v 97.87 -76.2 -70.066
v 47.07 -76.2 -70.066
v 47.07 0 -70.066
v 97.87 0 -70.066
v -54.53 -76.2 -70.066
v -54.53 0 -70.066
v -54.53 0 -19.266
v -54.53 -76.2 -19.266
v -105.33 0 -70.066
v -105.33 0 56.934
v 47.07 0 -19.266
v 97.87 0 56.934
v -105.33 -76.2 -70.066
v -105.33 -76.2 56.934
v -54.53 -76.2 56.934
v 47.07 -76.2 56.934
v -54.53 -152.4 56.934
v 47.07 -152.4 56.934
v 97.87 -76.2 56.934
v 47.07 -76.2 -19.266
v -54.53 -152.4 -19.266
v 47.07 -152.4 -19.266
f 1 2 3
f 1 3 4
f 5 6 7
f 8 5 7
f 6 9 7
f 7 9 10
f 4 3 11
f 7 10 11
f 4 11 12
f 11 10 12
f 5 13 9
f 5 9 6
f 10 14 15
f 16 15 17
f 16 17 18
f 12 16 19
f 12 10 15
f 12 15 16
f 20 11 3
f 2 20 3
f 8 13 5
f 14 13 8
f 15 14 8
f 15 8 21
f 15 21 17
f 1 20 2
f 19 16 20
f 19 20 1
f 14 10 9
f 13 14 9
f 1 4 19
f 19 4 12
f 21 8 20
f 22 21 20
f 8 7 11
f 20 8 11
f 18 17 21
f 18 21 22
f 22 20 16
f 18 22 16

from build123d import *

# Parameters (mm, degrees)
F0_W     = 101.6
F0_H     = 76.2
F1_DEPTH = 76.2
F2_W     = 101.6
F2_H     = 76.2
F3_DEPTH = 76.2


with BuildPart() as f1:
    # F0 (on Front) → F1 (new body)
    with BuildSketch(Plane.XZ):
        with Locations((-3.729625, 18.833704)):
            Rectangle(F0_W, F0_H)
        Polygon((-54.529625, -19.266296), (-54.529625, 56.933704), (-105.329625, 56.933704), (-105.329625, -70.066296), (-54.529625, -70.066296), align=None)
        Polygon((97.870375, 56.933704), (47.070375, 56.933704), (47.070375, -19.266296), (47.070375, -70.066296), (97.870375, -70.066296), align=None)
    extrude(amount=F1_DEPTH)

    # F2 (on face) → F3 (join)
    with BuildSketch(Plane.XZ.offset(76.2)):
        with Locations((-3.729625, 18.833704)):
            Rectangle(F2_W, F2_H)
    extrude(amount=F3_DEPTH)


solid = f1.part
